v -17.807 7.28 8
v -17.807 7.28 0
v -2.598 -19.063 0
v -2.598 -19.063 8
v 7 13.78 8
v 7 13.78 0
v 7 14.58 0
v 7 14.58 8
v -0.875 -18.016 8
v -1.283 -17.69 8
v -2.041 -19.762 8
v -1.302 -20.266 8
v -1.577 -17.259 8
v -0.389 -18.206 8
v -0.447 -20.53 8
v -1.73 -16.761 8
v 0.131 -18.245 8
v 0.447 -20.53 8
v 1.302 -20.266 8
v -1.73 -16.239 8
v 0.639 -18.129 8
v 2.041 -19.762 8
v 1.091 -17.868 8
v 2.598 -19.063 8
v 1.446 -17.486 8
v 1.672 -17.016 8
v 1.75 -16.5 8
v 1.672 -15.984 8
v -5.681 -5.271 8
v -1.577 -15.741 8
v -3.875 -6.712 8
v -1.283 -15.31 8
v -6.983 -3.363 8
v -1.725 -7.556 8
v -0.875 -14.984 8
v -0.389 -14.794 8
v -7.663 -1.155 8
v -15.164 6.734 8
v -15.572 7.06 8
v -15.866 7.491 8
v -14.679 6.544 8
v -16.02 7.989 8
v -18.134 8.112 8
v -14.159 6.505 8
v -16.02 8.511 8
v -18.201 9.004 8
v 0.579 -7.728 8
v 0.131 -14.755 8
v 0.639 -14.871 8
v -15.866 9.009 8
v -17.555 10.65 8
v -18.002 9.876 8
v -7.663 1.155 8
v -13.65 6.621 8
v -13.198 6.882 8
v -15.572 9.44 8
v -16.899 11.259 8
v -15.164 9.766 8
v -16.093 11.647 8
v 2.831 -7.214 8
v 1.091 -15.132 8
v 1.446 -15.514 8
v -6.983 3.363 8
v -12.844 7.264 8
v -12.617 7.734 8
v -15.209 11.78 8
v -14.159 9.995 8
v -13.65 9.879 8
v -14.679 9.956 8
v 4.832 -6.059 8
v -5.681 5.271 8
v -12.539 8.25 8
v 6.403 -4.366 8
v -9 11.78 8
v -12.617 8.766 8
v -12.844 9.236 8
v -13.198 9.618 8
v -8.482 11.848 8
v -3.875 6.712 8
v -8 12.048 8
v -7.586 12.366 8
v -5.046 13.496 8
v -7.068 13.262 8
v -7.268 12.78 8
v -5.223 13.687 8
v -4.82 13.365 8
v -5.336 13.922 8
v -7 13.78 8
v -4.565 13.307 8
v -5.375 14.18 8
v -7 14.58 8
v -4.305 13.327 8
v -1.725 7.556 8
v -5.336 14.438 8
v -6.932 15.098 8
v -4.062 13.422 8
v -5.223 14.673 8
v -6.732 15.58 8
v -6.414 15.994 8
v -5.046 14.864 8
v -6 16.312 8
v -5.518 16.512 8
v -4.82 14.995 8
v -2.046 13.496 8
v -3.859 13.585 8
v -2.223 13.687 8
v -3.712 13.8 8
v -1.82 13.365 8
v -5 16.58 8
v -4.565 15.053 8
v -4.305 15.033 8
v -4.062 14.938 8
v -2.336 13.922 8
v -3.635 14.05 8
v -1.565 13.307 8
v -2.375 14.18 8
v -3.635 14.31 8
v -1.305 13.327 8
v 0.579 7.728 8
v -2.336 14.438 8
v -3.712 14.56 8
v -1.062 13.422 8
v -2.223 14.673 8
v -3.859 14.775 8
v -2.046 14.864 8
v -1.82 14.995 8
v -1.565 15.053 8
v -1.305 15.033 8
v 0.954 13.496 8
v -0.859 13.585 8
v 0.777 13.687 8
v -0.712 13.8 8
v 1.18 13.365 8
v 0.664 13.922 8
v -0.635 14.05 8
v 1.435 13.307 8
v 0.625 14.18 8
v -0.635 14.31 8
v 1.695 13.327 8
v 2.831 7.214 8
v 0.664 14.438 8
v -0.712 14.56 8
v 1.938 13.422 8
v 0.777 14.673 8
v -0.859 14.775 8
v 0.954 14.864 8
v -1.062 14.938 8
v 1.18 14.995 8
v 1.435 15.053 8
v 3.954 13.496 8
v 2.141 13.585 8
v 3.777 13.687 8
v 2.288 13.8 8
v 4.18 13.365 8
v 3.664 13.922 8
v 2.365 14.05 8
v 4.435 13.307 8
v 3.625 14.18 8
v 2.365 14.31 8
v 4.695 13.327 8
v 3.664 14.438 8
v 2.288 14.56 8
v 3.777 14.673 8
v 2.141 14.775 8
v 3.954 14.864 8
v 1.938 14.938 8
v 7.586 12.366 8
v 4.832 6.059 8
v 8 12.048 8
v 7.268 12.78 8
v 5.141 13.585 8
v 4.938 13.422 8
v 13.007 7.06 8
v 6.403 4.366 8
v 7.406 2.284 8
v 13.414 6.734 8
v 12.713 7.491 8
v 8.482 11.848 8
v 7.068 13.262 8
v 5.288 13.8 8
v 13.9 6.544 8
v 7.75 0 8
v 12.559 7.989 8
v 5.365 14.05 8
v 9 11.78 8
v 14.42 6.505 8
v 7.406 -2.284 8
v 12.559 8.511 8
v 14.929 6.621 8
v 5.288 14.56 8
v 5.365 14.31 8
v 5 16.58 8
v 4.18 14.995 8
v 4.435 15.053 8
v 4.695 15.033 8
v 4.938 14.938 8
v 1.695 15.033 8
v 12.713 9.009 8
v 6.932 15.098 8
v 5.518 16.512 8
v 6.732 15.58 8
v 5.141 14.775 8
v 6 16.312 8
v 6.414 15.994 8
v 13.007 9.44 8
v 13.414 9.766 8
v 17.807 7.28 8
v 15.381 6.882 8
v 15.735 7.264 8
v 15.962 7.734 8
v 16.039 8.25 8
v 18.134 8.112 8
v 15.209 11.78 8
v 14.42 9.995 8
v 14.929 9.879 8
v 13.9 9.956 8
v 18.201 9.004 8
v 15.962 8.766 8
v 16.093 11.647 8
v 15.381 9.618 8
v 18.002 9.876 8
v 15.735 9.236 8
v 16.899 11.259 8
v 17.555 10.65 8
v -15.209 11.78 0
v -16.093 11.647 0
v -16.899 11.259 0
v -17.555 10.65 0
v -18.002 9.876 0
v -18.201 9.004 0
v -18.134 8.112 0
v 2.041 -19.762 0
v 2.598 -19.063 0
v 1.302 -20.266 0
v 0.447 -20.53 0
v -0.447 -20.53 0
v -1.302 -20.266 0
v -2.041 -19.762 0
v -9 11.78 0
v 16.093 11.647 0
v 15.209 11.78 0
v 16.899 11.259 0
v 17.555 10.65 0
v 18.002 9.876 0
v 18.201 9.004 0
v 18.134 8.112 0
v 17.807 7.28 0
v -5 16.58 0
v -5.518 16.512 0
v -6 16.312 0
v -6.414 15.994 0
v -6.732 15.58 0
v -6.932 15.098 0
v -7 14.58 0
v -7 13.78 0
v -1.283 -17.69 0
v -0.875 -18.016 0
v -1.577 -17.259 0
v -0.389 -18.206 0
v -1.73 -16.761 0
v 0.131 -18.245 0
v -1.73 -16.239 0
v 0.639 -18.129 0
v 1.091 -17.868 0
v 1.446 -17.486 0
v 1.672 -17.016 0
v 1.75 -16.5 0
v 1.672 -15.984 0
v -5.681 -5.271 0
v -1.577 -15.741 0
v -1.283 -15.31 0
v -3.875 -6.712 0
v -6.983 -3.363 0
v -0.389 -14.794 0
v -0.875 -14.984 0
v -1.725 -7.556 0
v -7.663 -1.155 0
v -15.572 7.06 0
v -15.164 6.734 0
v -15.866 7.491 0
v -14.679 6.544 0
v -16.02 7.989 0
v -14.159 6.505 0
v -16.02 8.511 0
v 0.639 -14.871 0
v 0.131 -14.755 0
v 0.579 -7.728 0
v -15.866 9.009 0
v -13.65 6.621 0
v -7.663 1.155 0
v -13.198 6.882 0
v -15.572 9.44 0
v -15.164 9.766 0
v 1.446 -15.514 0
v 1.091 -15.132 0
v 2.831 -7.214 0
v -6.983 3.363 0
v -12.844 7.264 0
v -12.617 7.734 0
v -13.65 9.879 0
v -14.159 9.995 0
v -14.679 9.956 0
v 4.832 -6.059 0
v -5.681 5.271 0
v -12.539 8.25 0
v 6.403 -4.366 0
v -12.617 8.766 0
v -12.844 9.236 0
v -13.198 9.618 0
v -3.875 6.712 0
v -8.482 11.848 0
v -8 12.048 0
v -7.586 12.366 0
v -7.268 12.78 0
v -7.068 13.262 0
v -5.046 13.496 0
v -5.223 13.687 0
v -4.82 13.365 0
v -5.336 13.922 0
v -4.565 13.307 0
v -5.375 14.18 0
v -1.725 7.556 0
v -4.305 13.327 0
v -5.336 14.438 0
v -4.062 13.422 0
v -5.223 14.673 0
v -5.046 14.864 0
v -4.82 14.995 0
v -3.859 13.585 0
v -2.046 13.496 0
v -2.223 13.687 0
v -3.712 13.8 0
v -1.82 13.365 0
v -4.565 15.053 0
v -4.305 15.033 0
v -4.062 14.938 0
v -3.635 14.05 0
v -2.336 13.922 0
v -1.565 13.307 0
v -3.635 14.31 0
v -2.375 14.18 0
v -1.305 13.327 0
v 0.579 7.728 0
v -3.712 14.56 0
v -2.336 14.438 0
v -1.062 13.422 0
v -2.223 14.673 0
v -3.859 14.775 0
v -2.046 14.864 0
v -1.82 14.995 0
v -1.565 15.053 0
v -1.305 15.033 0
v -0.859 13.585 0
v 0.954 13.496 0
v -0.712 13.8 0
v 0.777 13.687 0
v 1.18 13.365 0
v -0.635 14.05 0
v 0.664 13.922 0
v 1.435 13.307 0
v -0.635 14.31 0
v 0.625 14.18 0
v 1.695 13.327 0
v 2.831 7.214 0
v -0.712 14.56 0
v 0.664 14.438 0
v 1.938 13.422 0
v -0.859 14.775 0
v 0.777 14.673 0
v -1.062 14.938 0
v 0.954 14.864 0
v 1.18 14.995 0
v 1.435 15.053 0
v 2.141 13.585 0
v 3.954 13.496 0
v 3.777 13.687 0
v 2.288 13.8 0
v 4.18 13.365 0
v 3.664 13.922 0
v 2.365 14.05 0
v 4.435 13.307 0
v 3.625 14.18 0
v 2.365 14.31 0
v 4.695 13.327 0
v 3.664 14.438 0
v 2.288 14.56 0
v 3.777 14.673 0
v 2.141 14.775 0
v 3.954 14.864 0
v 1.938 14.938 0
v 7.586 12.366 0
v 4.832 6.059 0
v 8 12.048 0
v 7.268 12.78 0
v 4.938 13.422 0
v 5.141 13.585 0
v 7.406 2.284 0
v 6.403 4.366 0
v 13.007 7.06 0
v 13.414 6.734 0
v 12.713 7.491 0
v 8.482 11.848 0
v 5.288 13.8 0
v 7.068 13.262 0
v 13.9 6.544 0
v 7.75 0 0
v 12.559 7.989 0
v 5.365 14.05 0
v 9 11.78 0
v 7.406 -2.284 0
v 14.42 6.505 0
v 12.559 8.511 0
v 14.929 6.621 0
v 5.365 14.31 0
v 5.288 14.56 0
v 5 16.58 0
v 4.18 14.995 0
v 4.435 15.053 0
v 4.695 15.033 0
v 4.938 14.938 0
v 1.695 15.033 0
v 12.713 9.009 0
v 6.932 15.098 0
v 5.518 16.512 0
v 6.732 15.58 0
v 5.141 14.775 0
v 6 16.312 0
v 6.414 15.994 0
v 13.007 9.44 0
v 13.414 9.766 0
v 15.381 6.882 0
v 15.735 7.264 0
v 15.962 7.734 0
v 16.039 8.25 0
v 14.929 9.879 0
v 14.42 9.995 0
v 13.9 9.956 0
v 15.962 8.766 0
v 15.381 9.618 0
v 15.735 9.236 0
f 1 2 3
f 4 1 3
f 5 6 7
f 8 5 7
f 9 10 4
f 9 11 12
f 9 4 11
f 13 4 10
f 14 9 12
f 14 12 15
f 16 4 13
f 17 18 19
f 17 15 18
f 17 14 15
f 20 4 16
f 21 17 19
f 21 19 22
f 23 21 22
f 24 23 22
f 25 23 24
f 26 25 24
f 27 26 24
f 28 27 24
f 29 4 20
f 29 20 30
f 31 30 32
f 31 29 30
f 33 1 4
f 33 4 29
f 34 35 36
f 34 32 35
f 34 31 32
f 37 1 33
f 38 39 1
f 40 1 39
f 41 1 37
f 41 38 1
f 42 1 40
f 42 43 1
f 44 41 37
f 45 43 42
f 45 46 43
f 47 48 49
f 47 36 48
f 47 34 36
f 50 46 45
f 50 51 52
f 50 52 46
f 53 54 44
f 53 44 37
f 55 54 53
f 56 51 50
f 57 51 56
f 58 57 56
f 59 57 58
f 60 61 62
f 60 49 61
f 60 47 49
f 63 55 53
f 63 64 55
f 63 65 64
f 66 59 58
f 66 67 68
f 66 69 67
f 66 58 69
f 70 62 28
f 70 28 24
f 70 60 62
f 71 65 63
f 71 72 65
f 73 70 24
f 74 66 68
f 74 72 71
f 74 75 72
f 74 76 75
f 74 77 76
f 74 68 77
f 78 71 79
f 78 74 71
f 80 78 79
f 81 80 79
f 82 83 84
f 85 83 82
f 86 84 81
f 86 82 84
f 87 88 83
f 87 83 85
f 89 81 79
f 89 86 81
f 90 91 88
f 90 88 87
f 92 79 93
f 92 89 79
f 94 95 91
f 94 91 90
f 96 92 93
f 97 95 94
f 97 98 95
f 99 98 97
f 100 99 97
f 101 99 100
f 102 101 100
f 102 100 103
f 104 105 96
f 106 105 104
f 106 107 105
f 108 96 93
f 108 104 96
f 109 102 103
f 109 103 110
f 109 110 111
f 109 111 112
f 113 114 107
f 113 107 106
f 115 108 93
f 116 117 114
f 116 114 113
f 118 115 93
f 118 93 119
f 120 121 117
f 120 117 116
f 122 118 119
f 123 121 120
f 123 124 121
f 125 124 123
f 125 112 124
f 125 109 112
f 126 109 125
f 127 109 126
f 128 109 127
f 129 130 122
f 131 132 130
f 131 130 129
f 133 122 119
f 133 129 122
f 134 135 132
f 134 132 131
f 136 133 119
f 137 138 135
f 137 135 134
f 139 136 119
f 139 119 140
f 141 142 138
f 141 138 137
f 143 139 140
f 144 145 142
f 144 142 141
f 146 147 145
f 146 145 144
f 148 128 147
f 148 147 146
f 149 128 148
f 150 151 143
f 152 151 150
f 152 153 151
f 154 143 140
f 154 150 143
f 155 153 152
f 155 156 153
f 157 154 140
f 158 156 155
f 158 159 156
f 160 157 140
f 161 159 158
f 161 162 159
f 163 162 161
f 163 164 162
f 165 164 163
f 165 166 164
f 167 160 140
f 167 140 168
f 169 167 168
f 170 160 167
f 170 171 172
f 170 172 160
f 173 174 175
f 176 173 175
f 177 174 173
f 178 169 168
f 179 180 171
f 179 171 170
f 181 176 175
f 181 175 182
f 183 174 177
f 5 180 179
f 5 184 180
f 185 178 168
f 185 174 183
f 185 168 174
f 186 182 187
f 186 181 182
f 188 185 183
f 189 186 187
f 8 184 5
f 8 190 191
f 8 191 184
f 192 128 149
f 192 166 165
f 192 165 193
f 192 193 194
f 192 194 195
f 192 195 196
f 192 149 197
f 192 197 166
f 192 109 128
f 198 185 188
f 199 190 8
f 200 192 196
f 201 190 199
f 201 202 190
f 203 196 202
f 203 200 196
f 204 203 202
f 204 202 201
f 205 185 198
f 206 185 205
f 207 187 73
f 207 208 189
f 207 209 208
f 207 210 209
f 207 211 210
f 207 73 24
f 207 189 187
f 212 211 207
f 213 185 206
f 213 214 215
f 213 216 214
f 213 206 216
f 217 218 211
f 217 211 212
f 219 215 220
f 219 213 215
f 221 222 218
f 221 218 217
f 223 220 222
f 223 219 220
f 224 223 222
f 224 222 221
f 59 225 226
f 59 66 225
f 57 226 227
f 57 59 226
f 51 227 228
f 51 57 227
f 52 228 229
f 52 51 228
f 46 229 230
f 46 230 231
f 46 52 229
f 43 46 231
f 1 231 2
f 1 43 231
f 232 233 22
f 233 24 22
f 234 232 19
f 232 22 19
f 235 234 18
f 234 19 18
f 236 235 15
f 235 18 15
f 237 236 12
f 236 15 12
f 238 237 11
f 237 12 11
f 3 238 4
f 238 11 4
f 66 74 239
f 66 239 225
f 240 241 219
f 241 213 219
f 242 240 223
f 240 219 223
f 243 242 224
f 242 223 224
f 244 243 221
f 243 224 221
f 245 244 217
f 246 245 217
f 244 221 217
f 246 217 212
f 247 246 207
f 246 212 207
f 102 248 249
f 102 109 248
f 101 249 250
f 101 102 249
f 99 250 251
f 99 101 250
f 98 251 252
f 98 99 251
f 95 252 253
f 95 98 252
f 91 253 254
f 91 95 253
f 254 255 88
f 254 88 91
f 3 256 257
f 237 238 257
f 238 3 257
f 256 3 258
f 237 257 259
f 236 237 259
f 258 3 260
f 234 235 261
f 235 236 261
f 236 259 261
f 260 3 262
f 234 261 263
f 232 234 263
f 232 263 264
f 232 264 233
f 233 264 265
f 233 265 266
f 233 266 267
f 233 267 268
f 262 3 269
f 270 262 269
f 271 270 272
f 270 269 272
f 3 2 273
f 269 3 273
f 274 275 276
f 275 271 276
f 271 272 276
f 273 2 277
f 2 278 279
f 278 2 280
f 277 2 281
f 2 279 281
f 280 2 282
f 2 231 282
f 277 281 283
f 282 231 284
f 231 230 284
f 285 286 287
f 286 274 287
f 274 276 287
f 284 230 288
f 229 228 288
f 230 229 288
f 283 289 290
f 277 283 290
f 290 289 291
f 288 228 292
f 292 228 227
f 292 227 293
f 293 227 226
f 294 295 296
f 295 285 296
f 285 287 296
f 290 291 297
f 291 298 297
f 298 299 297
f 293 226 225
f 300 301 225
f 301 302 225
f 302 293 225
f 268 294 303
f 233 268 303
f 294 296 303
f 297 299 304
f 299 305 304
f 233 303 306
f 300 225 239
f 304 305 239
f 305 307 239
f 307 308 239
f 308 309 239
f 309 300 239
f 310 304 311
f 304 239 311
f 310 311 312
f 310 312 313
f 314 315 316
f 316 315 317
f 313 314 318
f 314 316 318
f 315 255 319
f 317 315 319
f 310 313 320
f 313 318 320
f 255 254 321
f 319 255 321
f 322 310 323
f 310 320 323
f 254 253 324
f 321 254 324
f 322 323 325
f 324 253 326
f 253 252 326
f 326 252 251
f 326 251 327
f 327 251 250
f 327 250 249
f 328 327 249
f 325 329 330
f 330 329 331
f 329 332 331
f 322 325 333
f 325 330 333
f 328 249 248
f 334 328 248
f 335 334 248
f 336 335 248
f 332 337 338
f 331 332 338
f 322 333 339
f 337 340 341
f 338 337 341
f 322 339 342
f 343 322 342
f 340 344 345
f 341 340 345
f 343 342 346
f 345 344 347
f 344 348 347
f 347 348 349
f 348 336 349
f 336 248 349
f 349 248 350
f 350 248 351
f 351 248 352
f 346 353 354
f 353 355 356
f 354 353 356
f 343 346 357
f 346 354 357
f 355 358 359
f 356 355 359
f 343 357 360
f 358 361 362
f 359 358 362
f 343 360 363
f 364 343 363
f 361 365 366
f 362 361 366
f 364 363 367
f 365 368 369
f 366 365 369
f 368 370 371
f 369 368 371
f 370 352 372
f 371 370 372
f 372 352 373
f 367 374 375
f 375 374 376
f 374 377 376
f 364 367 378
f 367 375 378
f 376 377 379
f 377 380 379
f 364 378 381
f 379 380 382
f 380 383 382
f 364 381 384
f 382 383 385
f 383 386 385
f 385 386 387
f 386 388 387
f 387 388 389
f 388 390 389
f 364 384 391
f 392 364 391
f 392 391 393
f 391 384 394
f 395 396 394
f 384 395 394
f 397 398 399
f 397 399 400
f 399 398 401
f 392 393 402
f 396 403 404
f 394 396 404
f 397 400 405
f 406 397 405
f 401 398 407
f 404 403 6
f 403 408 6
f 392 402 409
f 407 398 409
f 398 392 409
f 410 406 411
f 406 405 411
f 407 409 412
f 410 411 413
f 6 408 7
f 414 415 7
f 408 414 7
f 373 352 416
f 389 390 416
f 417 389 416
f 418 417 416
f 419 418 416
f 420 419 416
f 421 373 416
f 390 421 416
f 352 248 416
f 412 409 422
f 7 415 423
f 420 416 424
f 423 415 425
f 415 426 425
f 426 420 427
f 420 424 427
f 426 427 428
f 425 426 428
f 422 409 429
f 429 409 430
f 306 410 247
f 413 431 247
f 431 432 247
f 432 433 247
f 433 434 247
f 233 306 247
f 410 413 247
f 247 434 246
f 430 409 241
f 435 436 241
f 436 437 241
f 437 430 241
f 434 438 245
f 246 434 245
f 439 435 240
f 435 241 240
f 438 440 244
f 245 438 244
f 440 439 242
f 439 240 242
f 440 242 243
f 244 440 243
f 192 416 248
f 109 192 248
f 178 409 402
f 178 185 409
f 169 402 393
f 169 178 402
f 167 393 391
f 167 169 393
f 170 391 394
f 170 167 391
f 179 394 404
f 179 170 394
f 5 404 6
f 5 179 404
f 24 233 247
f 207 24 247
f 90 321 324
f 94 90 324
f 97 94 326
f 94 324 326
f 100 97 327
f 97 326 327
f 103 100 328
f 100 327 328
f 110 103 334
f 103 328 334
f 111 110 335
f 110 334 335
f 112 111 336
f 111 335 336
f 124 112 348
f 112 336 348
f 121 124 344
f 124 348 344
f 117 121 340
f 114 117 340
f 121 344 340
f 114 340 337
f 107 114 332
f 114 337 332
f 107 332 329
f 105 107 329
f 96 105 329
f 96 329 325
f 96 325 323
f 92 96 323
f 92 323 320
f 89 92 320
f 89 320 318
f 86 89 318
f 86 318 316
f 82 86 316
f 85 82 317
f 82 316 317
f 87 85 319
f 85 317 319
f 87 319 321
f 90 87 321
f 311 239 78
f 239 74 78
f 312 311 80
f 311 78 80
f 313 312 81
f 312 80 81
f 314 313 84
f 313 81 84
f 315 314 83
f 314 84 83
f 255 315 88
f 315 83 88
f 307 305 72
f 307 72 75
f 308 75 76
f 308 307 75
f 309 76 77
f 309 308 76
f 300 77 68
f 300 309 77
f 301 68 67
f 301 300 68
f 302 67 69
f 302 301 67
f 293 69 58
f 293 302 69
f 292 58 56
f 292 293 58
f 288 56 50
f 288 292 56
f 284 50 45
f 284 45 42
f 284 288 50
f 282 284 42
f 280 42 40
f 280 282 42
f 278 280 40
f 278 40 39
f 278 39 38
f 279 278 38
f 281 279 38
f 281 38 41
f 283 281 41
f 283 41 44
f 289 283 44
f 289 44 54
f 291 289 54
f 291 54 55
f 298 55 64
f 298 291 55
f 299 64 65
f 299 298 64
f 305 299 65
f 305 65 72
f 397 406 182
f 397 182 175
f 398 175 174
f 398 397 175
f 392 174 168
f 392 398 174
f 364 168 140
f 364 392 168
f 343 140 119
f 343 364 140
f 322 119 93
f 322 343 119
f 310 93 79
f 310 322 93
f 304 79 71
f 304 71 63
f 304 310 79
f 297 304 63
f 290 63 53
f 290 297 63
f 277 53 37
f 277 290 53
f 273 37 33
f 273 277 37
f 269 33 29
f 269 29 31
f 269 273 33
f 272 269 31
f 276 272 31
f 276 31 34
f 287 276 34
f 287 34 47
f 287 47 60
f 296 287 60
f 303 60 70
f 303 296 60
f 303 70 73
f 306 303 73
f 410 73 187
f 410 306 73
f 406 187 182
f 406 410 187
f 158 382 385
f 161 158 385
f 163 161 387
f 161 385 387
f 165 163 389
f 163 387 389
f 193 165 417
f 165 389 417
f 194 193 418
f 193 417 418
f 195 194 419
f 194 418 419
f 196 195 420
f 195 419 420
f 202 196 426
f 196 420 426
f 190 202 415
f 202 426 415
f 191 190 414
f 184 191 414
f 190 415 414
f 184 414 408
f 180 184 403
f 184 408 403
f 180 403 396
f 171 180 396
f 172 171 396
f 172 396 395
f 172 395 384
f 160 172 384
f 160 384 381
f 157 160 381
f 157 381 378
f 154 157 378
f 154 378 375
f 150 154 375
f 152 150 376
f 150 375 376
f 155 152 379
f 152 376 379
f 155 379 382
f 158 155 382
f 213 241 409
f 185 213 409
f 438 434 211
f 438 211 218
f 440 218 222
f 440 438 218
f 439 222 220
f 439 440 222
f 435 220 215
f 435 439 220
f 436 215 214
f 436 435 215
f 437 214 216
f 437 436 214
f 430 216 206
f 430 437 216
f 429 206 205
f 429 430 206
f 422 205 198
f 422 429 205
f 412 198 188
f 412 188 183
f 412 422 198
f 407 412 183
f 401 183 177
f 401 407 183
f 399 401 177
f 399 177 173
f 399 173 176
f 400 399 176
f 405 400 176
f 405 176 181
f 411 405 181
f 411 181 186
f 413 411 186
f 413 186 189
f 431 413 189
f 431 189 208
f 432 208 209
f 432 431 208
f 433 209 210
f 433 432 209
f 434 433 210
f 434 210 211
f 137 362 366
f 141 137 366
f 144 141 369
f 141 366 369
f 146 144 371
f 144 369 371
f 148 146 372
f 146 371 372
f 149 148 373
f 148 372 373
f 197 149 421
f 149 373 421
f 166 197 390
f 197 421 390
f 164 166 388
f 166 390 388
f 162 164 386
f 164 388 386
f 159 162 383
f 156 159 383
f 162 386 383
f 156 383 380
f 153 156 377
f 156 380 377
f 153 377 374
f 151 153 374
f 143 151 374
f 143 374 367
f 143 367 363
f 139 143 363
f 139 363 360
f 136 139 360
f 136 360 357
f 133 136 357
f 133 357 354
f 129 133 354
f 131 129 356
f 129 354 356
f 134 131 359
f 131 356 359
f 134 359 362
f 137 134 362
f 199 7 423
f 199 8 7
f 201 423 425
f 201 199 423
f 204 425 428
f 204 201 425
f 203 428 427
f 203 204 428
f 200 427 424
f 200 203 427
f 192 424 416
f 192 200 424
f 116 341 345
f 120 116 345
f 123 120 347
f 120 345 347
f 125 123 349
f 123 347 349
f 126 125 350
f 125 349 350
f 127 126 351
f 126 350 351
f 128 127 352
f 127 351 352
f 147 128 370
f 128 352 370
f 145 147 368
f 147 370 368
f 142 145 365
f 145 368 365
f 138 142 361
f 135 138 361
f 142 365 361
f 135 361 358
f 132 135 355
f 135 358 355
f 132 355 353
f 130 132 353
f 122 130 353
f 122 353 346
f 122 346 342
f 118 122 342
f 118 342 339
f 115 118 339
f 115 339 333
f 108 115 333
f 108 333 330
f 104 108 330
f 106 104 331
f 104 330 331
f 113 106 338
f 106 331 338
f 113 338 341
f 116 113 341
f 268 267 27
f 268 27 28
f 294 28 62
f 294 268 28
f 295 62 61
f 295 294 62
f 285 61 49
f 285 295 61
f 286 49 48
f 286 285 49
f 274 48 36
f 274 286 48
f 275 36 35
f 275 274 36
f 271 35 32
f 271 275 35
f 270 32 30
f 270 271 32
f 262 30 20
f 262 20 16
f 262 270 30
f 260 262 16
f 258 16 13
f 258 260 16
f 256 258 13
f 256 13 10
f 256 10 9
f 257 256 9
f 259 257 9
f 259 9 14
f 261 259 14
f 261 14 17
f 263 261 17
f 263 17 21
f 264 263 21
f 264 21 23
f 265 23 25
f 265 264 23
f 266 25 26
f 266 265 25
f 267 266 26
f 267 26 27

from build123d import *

# Parameters (mm, degrees)
MODEL_R             = 1.7499965
MODEL_R_2           = 7.75
BOSS_EXTRUDE1_DEPTH = 8
FILLET1_R           = 3
SKETCH1_W           = 14
SKETCH1_H           = 4.8
SKETCH1_R           = 0.875
BOSS_EXTRUDE2_DEPTH = 8
FILLET2_R           = 2


with BuildPart() as part:
    # Model → Boss-Extrude1 (new body)
    with BuildSketch(Plane.XY):
        Polygon((20.40532142, 11.78), (-20.40532142, 11.78), (0, -23.563053444), align=None)
        with Locations((0, -16.5)):
            Circle(MODEL_R, mode=Mode.SUBTRACT)
        Circle(MODEL_R_2, mode=Mode.SUBTRACT)
        with Locations((-14.289419163, 8.25)):
            Circle(MODEL_R, mode=Mode.SUBTRACT)
        with Locations((14.289419163, 8.25)):
            Circle(MODEL_R, mode=Mode.SUBTRACT)
    extrude(amount=BOSS_EXTRUDE1_DEPTH)

    # Fillet1
    fillet1_edges = [part.edges().sort_by_distance(p)[0] for p in [
        (0, -23.563053444, 4),
        (-20.40532142, 11.78, 4),
        (20.40532142, 11.78, 4),
    ]]
    fillet(fillet1_edges, radius=FILLET1_R)

    # Sketch1 → Boss-Extrude2 (add)
    with BuildSketch(Plane(origin=(0, 0, 0), x_dir=(-1, 0, 0), z_dir=(0, 0, -1))):
        with Locations((0, 14.18)):
            Rectangle(SKETCH1_W, SKETCH1_H)
        with Locations((-1.5, 14.18)):
            Circle(SKETCH1_R, mode=Mode.SUBTRACT)
        with Locations((-4.5, 14.18)):
            Circle(SKETCH1_R, mode=Mode.SUBTRACT)
        with Locations((1.5, 14.18)):
            Circle(SKETCH1_R, mode=Mode.SUBTRACT)
        with Locations((4.5, 14.18)):
            Circle(SKETCH1_R, mode=Mode.SUBTRACT)
    extrude(amount=-BOSS_EXTRUDE2_DEPTH)

    # Fillet2
    fillet2_edges = [part.edges().sort_by_distance(p)[0] for p in [
        (-7, 11.78, 4),
        (7, 11.78, 4),
        (7, 16.58, 4),
        (-7, 16.58, 4),
    ]]
    fillet(fillet2_edges, radius=FILLET2_R)


solid = part.part
